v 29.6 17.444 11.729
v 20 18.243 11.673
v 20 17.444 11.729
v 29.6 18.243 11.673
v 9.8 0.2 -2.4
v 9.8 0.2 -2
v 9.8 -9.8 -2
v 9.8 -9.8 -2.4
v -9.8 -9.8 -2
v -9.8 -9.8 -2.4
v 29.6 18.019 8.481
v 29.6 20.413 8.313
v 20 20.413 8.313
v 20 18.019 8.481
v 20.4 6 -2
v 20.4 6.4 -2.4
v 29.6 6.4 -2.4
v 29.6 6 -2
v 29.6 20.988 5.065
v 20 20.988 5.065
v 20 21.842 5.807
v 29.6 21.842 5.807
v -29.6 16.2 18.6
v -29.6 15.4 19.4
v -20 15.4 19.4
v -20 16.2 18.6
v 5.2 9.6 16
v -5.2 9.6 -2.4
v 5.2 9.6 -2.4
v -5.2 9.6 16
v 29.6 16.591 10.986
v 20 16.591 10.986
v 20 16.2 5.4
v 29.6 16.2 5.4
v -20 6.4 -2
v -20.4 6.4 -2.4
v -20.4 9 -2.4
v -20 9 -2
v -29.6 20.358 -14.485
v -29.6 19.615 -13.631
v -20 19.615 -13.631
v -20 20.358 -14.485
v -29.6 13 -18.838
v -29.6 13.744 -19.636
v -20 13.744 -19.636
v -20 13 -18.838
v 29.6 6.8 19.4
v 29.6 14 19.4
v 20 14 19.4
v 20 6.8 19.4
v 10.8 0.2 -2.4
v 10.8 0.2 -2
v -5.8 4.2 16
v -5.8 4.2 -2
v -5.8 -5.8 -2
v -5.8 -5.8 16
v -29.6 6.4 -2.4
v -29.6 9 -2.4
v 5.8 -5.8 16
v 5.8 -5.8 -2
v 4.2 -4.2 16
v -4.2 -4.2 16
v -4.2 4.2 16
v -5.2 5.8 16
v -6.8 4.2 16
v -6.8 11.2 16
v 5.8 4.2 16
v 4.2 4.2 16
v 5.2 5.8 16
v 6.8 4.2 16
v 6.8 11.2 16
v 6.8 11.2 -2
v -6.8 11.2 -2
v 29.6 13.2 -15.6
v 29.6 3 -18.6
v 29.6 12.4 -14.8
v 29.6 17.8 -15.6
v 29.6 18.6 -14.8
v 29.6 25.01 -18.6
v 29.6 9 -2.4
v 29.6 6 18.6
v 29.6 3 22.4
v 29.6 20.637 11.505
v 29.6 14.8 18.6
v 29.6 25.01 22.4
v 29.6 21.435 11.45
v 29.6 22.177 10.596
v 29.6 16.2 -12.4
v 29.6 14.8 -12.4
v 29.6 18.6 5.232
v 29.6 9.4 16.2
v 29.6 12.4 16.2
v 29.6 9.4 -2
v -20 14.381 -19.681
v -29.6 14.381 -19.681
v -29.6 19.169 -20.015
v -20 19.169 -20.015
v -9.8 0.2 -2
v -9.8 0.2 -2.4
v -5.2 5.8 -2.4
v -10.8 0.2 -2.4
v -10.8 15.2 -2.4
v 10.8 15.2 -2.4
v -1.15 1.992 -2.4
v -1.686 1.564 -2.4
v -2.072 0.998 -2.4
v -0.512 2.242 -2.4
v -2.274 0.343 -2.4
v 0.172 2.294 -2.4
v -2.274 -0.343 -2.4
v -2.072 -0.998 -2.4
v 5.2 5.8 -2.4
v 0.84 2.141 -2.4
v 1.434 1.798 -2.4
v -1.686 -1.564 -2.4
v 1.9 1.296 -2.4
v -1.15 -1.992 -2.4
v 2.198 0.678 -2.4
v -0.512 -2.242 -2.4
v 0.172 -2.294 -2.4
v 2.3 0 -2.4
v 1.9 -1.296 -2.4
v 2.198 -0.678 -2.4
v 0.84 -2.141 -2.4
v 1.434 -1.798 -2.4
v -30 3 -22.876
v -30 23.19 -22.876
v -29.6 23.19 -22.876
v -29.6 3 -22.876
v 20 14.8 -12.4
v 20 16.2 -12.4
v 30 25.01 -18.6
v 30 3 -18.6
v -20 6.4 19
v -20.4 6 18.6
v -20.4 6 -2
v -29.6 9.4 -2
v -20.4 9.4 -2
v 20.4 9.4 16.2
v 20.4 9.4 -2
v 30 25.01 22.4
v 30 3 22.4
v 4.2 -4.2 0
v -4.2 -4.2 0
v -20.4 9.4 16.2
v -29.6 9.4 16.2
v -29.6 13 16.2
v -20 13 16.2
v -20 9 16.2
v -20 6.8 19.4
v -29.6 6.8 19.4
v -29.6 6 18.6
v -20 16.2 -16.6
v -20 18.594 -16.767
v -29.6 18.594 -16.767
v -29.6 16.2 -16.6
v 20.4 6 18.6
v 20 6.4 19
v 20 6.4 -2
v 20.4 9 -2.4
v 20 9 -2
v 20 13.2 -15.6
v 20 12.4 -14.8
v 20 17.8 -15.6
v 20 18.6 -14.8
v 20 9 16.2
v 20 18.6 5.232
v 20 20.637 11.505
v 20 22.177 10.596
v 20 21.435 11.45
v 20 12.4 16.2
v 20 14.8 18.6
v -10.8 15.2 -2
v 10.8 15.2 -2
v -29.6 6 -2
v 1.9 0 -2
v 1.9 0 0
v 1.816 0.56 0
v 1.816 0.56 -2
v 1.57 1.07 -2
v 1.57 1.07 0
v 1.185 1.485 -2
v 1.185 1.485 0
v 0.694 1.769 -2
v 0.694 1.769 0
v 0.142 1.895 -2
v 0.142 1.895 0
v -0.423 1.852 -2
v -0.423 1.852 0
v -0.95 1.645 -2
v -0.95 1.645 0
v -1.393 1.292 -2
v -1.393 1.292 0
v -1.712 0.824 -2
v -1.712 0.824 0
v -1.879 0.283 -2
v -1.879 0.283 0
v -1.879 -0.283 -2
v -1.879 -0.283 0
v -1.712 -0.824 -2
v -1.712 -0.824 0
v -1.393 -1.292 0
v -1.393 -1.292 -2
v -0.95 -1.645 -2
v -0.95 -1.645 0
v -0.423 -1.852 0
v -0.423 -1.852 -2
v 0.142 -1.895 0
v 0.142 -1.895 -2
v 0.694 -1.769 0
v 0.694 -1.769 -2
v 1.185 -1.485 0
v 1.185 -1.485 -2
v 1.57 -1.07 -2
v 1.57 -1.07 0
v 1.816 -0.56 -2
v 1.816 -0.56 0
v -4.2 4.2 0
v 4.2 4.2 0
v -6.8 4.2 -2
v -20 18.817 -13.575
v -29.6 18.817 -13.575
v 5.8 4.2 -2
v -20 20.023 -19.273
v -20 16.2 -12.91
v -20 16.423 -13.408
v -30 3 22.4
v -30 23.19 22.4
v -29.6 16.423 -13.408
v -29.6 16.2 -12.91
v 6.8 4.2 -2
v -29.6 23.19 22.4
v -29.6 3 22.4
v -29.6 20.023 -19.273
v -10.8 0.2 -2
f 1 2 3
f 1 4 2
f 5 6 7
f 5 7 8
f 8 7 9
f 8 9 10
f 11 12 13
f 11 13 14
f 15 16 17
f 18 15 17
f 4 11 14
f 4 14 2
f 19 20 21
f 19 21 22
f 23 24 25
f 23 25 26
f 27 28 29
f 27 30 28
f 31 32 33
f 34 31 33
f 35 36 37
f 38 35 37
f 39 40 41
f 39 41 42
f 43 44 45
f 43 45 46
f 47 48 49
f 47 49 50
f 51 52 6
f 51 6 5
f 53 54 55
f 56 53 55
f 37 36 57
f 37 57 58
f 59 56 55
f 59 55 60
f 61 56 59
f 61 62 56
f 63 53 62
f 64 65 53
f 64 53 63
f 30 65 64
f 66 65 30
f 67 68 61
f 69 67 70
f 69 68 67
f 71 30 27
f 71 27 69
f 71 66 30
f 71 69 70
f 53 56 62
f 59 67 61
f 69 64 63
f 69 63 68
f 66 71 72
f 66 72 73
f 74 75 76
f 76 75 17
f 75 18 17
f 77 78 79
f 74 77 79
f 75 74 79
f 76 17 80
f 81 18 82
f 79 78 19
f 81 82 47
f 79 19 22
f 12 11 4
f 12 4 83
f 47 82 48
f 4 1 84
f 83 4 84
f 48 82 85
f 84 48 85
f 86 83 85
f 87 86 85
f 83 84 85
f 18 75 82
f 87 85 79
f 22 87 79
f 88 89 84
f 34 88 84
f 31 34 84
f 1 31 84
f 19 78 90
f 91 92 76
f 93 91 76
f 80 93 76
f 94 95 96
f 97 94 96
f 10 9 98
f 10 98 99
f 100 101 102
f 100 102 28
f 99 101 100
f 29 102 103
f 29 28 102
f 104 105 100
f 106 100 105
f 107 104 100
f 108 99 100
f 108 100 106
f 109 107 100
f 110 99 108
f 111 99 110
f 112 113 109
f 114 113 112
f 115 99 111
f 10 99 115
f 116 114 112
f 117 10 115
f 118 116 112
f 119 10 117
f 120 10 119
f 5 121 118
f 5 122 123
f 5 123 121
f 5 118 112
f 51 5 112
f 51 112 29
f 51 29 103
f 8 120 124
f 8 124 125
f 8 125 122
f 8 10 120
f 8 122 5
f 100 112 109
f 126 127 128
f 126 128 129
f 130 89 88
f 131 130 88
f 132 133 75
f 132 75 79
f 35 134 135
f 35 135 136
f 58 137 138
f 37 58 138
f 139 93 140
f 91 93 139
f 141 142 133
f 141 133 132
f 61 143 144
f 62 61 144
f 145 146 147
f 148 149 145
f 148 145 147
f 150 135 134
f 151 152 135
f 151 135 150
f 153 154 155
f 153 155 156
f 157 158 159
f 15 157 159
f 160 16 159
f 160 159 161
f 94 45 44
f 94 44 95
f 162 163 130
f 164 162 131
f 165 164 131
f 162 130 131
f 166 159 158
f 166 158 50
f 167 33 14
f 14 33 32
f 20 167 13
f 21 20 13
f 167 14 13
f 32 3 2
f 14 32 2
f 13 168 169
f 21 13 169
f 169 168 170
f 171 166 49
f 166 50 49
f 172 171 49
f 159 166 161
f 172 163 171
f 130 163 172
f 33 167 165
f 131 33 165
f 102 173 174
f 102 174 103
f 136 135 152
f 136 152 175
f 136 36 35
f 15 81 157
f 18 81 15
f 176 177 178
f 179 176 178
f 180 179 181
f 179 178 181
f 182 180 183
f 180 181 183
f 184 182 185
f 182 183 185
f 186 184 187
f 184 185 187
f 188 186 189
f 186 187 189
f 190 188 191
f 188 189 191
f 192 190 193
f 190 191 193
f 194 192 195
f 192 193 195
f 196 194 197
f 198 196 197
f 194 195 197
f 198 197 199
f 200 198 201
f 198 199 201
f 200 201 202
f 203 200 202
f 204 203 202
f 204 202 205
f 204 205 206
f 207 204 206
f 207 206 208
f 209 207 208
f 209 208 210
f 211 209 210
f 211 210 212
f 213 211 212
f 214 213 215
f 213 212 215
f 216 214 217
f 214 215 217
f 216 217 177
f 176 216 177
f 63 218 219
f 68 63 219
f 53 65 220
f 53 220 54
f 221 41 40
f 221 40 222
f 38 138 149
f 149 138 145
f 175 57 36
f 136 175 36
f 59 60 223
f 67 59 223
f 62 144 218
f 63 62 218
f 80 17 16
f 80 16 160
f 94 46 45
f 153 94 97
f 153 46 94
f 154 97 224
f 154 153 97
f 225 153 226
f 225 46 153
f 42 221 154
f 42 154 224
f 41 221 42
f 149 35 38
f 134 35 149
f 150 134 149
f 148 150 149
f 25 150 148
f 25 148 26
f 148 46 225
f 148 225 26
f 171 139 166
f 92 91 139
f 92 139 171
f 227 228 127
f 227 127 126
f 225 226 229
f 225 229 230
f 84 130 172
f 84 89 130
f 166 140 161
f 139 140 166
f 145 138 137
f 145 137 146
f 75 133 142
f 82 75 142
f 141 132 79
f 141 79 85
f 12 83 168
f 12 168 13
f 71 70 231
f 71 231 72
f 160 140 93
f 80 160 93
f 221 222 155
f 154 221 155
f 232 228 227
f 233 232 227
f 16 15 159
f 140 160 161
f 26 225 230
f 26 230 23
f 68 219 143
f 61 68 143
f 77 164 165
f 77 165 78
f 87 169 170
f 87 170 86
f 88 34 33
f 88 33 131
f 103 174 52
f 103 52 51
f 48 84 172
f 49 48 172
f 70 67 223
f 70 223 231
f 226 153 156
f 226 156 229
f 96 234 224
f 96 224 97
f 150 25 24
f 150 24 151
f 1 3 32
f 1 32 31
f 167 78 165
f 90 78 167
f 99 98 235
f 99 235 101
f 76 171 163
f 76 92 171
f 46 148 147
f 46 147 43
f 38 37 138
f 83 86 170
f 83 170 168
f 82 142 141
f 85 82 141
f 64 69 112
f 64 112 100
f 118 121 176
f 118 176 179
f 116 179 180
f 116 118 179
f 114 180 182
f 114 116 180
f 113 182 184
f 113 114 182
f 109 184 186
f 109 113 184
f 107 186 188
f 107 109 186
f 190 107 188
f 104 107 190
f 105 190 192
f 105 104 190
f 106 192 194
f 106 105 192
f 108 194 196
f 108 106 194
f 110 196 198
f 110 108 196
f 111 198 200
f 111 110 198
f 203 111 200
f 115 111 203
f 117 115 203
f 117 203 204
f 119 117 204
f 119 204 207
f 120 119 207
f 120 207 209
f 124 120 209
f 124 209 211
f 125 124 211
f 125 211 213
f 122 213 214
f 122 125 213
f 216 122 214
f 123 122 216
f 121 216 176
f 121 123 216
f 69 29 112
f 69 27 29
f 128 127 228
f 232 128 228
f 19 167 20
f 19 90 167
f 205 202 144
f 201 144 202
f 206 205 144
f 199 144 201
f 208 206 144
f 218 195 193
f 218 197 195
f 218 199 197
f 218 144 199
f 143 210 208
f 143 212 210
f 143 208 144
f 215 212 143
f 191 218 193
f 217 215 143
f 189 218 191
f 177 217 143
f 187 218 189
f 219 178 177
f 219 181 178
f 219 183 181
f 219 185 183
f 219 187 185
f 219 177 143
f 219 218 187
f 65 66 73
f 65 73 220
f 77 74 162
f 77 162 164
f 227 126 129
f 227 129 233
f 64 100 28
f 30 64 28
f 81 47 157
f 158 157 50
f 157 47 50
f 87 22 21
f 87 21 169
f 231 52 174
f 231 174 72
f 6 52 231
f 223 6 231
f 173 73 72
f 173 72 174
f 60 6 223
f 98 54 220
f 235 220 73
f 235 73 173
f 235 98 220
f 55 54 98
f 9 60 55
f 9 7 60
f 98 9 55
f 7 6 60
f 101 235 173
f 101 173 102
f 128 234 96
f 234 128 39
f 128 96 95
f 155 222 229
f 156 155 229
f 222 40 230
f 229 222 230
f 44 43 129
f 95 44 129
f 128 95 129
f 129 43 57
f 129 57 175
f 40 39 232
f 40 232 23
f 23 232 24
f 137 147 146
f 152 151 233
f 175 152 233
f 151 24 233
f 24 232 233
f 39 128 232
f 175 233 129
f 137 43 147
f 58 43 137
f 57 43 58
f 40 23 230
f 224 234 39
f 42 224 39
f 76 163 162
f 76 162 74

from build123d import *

# Parameters (mm, degrees)
F1_DEPTH    = 16
F0_W        = 8.4
F0_H        = 8.4
F0_R        = 1.9
F2_DEPTH    = 2.4
F4_W        = 3.6
F4_H        = 3.2
F5_DEPTH    = 5
F6_T1_DEPTH = 14.1146927807
F6_T3_DEPTH = 13.8486241795
F8_W        = 3
F8_H        = 3.2
F8_W_2      = 1.4
F9_DEPTH    = 5
F10_SIZE    = 0.8
F12_SIZE    = 0.4
F12_2_SIZE  = 0.4
F13_SIZE    = 0.4
F14_W       = 4
F14_H       = 0.4
F16_W       = 20.190256201
F16_H       = 45.2759127293
F17_DEPTH   = 0.4
F18_W       = 22.0095793974
F18_H       = 41
F19_DEPTH   = 0.4


# Not quite as in the source:
# - a fillet or chamfer that OpenCascade refuses, or shapes differently, is made with other operations: its cross-section is extruded or revolved along the edge and cut away or added
# - a feature names something its author has since deleted; it is built from what else it names


with BuildPart() as f1:
    # F0 (on Top) → F1 (new body)
    with BuildSketch(Plane.XY):
        Polygon((-5.8, 4.2), (-4.2, 4.2), (4.2, 4.2), (5.8, 4.2), (5.8, 5.8), (5.2, 5.8), (-5.2, 5.8), (-5.8, 5.8), align=None)
        Polygon((-4.2, -4.2), (-4.2, 4.2), (-5.8, 4.2), (-5.8, -5.8), (5.8, -5.8), (5.8, 4.2), (4.2, 4.2), (4.2, -4.2), align=None)
        Polygon((-6.8, 4.2), (-5.8, 4.2), (-5.8, 5.8), (-5.2, 5.8), (-5.2, 9.6), (5.2, 9.6), (5.2, 5.8), (5.8, 5.8), (5.8, 4.2), (6.8, 4.2), (6.8, 11.2), (-6.8, 11.2), align=None)
    extrude(amount=F1_DEPTH)

    # F0 (on Top) → F2 (join)
    with BuildSketch(Plane.XY):
        Polygon((-5.8, 4.2), (-4.2, 4.2), (4.2, 4.2), (5.8, 4.2), (5.8, 5.8), (5.2, 5.8), (-5.2, 5.8), (-5.8, 5.8), align=None)
        Rectangle(F0_W, F0_H)
        Circle(F0_R, mode=Mode.SUBTRACT)
        Polygon((-6.8, 4.2), (-5.8, 4.2), (-5.8, 5.8), (-5.2, 5.8), (-5.2, 9.6), (5.2, 9.6), (5.2, 5.8), (5.8, 5.8), (5.8, 4.2), (6.8, 4.2), (6.8, 11.2), (-6.8, 11.2), align=None)
        Polygon((-4.2, -4.2), (-4.2, 4.2), (-5.8, 4.2), (-5.8, -5.8), (5.8, -5.8), (5.8, 4.2), (4.2, 4.2), (4.2, -4.2), align=None)
    extrude(amount=-F2_DEPTH)

    # F13
    f13_edges = [f1.edges().sort_by_distance(p)[0] for p in [
        (-1.9, 0, -2.4),
    ]]
    chamfer(f13_edges, length=F13_SIZE)

    # F15: sweep along a path in F15_path
    with BuildLine(Plane(origin=(-5.8, 4.2, -2.4), x_dir=(0, 1, 0), z_dir=(0, 0, 1))) as f15_path:
        Line((0, 0), (-10, 0))
        Line((-10, 0), (-10, -11.6))
        Line((-10, -11.6), (0, -11.6))
        Line((0, -11.6), (0, -12.6))
        Line((0, -12.6), (7, -12.6))
        Line((7, -12.6), (7, 1))
        Line((7, 1), (0, 1))
        Line((0, 1), (0, 0))
    # F14 (on Front) → F15 (sweep)
    with BuildSketch(Plane.XZ):
        with Locations((-7.8, -2.2)):
            Rectangle(F14_W, F14_H)
    sweep(path=f15_path.line, transition=Transition.RIGHT)


with BuildPart() as f5:
    # F4 (on offset) → F5 (new body, symmetric)
    with BuildSketch(Plane.YZ.offset(-25)):
        Polygon((6, 19.4), (6, -2.4), (9.4, -2.4), (9.4, 16.2), (9.4, 19.4), align=None)
        Polygon((13, 19.4), (13, 16.2), (13, -16.6), (14.5960929631, -16.6), (14.8271182356, -13.2961846812), (16.2, -13.3921859261), (16.2, -12.9097403669), (16.2, 19.4), align=None)
        with Locations((11.2, 17.8)):
            Rectangle(F4_W, F4_H)
        Polygon((14.8271182356, -13.2961846812), (14.5960929631, -16.6), (16.2, -16.6), (16.2, -13.3921859261), align=None)
        Polygon((16.2, -16.6), (14.5960929631, -16.6), (14.3806768036, -19.6805946028), (19.9670354851, -20.0712308558), (20.413476917, -13.6868209341), (18.8173744366, -13.5752105762), (18.5941537206, -16.767415537), align=None)
        Polygon((14.5960929631, -16.6), (13, -16.6), (14.3806768036, -19.6805946028), align=None)
        Polygon((16.2, -13.3921859261), (16.2, -16.6), (16.423220716, -13.4077950392), align=None)
        Polygon((16.423220716, -13.4077950392), (16.2, -12.9097403669), (16.2, -13.3921859261), align=None)
        Polygon((14.3806768036, -19.6805946028), (13, -16.6), (13, -19.5840482756), align=None)
    extrude(amount=F5_DEPTH, both=True)

    # F6: chamfer of 0.8 on 5 edges, made by hand

    # F6_s2 → F6_t1 (cut)
    with BuildSketch(Plane.YZ.offset(-32.0573463904)):
        Polygon((20.0228406641, -19.2731796156), (19.1689842449, -20.0154256768), (19.9670354851, -20.0712308558), align=None)
        Polygon((19.6154256768, -13.6310157551), (20.357671738, -14.4848721744), (20.413476917, -13.6868209341), align=None)
        Polygon((15.4, 19.4), (16.2, 18.6), (16.2, 19.4), align=None)
        Polygon((6, 18.6), (6.8, 19.4), (6, 19.4), align=None)
    extrude(amount=F6_T1_DEPTH, mode=Mode.SUBTRACT)

    # F6_s4 → F6_t3 (cut)
    with BuildSketch(Plane.YZ.offset(-31.9243120897)):
        Polygon((13.744194821, -19.6360874469), (13, -18.8380362067), (13, -19.5840482756), align=None)
    extrude(amount=F6_T3_DEPTH, mode=Mode.SUBTRACT)

    # F12
    f12_edges = [f5.edges().sort_by_distance(p)[0] for p in [
        (-25, 6, -2.4),
        (-20, 7.7, -2.4),
        (-25, 9.4, -2.4),
        (-20, 9.4, 6.9),
        (-20, 6, 8.1),
    ]]
    chamfer(f12_edges, length=F12_SIZE)

    # F16 (on face) → F17 (join)
    with BuildSketch(Plane(origin=(-30, 0, 0), x_dir=(0, -1, 0), z_dir=(-1, 0, 0))):
        with Locations((-13.0951281005, -0.2379563647)):
            Rectangle(F16_W, F16_H)
    extrude(amount=-F17_DEPTH)


with BuildPart() as f9:
    # F8 (on offset) → F9 (new body, symmetric)
    with BuildSketch(Plane.YZ.offset(25)):
        Polygon((9.4, 16.2), (9.4, 19.4), (6, 19.4), (6, -2.4), (9.4, -2.4), align=None)
        with Locations((10.9, 17.8)):
            Rectangle(F8_W, F8_H)
        Polygon((14.8, 19.4), (12.4, 19.4), (12.4, 16.2), (12.4, -15.6), (14.8, -15.6), (14.8, -12.4), align=None)
        with Locations((15.5, -14)):
            Rectangle(F8_W_2, F8_H)
        Polygon((16.2, 5.4), (16.2, -12.4), (16.2, -15.6), (18.6, -15.6), (18.6, 5.2321756513), align=None)
        Polygon((18.6, 5.4), (16.2, 5.4), (18.6, 5.2321756513), align=None)
        Polygon((16.646441432, 11.7844099217), (16.2, 5.4), (18.6, 5.4), (18.6, 5.2321756513), (21.7863586815, 5.009363747), (22.2328001134, 11.3937736687), (20.636697633, 11.5053840267), (20.413476917, 8.3131790659), (18.0193231964, 8.4805946028), (18.2425439124, 11.6727995637), align=None)
    extrude(amount=F9_DEPTH, both=True)

    # F10
    f10_edges = [f9.edges().sort_by_distance(p)[0] for p in [
        (25, 22.2328, 11.393774),
        (25, 21.786359, 5.009364),
        (25, 16.646441, 11.78441),
        (25, 6, 19.4),
        (25, 14.8, 19.4),
        (25, 18.6, -15.6),
        (25, 12.4, -15.6),
    ]]
    chamfer(f10_edges, length=F10_SIZE)

    # F12#2
    f12_2_edges = [f9.edges().sort_by_distance(p)[0] for p in [
        (20, 6, 8.1),
        (25, 6, -2.4),
        (20, 7.7, -2.4),
        (25, 9.4, -2.4),
        (20, 9.4, 6.9),
    ]]
    chamfer(f12_2_edges, length=F12_2_SIZE)

    # F18 (on face) → F19 (join)
    with BuildSketch(Plane.YZ.offset(30)):
        with Locations((14.0047896987, 1.9)):
            Rectangle(F18_W, F18_H)
    extrude(amount=-F19_DEPTH)


solid = Compound([f1.part, f5.part, f9.part])
